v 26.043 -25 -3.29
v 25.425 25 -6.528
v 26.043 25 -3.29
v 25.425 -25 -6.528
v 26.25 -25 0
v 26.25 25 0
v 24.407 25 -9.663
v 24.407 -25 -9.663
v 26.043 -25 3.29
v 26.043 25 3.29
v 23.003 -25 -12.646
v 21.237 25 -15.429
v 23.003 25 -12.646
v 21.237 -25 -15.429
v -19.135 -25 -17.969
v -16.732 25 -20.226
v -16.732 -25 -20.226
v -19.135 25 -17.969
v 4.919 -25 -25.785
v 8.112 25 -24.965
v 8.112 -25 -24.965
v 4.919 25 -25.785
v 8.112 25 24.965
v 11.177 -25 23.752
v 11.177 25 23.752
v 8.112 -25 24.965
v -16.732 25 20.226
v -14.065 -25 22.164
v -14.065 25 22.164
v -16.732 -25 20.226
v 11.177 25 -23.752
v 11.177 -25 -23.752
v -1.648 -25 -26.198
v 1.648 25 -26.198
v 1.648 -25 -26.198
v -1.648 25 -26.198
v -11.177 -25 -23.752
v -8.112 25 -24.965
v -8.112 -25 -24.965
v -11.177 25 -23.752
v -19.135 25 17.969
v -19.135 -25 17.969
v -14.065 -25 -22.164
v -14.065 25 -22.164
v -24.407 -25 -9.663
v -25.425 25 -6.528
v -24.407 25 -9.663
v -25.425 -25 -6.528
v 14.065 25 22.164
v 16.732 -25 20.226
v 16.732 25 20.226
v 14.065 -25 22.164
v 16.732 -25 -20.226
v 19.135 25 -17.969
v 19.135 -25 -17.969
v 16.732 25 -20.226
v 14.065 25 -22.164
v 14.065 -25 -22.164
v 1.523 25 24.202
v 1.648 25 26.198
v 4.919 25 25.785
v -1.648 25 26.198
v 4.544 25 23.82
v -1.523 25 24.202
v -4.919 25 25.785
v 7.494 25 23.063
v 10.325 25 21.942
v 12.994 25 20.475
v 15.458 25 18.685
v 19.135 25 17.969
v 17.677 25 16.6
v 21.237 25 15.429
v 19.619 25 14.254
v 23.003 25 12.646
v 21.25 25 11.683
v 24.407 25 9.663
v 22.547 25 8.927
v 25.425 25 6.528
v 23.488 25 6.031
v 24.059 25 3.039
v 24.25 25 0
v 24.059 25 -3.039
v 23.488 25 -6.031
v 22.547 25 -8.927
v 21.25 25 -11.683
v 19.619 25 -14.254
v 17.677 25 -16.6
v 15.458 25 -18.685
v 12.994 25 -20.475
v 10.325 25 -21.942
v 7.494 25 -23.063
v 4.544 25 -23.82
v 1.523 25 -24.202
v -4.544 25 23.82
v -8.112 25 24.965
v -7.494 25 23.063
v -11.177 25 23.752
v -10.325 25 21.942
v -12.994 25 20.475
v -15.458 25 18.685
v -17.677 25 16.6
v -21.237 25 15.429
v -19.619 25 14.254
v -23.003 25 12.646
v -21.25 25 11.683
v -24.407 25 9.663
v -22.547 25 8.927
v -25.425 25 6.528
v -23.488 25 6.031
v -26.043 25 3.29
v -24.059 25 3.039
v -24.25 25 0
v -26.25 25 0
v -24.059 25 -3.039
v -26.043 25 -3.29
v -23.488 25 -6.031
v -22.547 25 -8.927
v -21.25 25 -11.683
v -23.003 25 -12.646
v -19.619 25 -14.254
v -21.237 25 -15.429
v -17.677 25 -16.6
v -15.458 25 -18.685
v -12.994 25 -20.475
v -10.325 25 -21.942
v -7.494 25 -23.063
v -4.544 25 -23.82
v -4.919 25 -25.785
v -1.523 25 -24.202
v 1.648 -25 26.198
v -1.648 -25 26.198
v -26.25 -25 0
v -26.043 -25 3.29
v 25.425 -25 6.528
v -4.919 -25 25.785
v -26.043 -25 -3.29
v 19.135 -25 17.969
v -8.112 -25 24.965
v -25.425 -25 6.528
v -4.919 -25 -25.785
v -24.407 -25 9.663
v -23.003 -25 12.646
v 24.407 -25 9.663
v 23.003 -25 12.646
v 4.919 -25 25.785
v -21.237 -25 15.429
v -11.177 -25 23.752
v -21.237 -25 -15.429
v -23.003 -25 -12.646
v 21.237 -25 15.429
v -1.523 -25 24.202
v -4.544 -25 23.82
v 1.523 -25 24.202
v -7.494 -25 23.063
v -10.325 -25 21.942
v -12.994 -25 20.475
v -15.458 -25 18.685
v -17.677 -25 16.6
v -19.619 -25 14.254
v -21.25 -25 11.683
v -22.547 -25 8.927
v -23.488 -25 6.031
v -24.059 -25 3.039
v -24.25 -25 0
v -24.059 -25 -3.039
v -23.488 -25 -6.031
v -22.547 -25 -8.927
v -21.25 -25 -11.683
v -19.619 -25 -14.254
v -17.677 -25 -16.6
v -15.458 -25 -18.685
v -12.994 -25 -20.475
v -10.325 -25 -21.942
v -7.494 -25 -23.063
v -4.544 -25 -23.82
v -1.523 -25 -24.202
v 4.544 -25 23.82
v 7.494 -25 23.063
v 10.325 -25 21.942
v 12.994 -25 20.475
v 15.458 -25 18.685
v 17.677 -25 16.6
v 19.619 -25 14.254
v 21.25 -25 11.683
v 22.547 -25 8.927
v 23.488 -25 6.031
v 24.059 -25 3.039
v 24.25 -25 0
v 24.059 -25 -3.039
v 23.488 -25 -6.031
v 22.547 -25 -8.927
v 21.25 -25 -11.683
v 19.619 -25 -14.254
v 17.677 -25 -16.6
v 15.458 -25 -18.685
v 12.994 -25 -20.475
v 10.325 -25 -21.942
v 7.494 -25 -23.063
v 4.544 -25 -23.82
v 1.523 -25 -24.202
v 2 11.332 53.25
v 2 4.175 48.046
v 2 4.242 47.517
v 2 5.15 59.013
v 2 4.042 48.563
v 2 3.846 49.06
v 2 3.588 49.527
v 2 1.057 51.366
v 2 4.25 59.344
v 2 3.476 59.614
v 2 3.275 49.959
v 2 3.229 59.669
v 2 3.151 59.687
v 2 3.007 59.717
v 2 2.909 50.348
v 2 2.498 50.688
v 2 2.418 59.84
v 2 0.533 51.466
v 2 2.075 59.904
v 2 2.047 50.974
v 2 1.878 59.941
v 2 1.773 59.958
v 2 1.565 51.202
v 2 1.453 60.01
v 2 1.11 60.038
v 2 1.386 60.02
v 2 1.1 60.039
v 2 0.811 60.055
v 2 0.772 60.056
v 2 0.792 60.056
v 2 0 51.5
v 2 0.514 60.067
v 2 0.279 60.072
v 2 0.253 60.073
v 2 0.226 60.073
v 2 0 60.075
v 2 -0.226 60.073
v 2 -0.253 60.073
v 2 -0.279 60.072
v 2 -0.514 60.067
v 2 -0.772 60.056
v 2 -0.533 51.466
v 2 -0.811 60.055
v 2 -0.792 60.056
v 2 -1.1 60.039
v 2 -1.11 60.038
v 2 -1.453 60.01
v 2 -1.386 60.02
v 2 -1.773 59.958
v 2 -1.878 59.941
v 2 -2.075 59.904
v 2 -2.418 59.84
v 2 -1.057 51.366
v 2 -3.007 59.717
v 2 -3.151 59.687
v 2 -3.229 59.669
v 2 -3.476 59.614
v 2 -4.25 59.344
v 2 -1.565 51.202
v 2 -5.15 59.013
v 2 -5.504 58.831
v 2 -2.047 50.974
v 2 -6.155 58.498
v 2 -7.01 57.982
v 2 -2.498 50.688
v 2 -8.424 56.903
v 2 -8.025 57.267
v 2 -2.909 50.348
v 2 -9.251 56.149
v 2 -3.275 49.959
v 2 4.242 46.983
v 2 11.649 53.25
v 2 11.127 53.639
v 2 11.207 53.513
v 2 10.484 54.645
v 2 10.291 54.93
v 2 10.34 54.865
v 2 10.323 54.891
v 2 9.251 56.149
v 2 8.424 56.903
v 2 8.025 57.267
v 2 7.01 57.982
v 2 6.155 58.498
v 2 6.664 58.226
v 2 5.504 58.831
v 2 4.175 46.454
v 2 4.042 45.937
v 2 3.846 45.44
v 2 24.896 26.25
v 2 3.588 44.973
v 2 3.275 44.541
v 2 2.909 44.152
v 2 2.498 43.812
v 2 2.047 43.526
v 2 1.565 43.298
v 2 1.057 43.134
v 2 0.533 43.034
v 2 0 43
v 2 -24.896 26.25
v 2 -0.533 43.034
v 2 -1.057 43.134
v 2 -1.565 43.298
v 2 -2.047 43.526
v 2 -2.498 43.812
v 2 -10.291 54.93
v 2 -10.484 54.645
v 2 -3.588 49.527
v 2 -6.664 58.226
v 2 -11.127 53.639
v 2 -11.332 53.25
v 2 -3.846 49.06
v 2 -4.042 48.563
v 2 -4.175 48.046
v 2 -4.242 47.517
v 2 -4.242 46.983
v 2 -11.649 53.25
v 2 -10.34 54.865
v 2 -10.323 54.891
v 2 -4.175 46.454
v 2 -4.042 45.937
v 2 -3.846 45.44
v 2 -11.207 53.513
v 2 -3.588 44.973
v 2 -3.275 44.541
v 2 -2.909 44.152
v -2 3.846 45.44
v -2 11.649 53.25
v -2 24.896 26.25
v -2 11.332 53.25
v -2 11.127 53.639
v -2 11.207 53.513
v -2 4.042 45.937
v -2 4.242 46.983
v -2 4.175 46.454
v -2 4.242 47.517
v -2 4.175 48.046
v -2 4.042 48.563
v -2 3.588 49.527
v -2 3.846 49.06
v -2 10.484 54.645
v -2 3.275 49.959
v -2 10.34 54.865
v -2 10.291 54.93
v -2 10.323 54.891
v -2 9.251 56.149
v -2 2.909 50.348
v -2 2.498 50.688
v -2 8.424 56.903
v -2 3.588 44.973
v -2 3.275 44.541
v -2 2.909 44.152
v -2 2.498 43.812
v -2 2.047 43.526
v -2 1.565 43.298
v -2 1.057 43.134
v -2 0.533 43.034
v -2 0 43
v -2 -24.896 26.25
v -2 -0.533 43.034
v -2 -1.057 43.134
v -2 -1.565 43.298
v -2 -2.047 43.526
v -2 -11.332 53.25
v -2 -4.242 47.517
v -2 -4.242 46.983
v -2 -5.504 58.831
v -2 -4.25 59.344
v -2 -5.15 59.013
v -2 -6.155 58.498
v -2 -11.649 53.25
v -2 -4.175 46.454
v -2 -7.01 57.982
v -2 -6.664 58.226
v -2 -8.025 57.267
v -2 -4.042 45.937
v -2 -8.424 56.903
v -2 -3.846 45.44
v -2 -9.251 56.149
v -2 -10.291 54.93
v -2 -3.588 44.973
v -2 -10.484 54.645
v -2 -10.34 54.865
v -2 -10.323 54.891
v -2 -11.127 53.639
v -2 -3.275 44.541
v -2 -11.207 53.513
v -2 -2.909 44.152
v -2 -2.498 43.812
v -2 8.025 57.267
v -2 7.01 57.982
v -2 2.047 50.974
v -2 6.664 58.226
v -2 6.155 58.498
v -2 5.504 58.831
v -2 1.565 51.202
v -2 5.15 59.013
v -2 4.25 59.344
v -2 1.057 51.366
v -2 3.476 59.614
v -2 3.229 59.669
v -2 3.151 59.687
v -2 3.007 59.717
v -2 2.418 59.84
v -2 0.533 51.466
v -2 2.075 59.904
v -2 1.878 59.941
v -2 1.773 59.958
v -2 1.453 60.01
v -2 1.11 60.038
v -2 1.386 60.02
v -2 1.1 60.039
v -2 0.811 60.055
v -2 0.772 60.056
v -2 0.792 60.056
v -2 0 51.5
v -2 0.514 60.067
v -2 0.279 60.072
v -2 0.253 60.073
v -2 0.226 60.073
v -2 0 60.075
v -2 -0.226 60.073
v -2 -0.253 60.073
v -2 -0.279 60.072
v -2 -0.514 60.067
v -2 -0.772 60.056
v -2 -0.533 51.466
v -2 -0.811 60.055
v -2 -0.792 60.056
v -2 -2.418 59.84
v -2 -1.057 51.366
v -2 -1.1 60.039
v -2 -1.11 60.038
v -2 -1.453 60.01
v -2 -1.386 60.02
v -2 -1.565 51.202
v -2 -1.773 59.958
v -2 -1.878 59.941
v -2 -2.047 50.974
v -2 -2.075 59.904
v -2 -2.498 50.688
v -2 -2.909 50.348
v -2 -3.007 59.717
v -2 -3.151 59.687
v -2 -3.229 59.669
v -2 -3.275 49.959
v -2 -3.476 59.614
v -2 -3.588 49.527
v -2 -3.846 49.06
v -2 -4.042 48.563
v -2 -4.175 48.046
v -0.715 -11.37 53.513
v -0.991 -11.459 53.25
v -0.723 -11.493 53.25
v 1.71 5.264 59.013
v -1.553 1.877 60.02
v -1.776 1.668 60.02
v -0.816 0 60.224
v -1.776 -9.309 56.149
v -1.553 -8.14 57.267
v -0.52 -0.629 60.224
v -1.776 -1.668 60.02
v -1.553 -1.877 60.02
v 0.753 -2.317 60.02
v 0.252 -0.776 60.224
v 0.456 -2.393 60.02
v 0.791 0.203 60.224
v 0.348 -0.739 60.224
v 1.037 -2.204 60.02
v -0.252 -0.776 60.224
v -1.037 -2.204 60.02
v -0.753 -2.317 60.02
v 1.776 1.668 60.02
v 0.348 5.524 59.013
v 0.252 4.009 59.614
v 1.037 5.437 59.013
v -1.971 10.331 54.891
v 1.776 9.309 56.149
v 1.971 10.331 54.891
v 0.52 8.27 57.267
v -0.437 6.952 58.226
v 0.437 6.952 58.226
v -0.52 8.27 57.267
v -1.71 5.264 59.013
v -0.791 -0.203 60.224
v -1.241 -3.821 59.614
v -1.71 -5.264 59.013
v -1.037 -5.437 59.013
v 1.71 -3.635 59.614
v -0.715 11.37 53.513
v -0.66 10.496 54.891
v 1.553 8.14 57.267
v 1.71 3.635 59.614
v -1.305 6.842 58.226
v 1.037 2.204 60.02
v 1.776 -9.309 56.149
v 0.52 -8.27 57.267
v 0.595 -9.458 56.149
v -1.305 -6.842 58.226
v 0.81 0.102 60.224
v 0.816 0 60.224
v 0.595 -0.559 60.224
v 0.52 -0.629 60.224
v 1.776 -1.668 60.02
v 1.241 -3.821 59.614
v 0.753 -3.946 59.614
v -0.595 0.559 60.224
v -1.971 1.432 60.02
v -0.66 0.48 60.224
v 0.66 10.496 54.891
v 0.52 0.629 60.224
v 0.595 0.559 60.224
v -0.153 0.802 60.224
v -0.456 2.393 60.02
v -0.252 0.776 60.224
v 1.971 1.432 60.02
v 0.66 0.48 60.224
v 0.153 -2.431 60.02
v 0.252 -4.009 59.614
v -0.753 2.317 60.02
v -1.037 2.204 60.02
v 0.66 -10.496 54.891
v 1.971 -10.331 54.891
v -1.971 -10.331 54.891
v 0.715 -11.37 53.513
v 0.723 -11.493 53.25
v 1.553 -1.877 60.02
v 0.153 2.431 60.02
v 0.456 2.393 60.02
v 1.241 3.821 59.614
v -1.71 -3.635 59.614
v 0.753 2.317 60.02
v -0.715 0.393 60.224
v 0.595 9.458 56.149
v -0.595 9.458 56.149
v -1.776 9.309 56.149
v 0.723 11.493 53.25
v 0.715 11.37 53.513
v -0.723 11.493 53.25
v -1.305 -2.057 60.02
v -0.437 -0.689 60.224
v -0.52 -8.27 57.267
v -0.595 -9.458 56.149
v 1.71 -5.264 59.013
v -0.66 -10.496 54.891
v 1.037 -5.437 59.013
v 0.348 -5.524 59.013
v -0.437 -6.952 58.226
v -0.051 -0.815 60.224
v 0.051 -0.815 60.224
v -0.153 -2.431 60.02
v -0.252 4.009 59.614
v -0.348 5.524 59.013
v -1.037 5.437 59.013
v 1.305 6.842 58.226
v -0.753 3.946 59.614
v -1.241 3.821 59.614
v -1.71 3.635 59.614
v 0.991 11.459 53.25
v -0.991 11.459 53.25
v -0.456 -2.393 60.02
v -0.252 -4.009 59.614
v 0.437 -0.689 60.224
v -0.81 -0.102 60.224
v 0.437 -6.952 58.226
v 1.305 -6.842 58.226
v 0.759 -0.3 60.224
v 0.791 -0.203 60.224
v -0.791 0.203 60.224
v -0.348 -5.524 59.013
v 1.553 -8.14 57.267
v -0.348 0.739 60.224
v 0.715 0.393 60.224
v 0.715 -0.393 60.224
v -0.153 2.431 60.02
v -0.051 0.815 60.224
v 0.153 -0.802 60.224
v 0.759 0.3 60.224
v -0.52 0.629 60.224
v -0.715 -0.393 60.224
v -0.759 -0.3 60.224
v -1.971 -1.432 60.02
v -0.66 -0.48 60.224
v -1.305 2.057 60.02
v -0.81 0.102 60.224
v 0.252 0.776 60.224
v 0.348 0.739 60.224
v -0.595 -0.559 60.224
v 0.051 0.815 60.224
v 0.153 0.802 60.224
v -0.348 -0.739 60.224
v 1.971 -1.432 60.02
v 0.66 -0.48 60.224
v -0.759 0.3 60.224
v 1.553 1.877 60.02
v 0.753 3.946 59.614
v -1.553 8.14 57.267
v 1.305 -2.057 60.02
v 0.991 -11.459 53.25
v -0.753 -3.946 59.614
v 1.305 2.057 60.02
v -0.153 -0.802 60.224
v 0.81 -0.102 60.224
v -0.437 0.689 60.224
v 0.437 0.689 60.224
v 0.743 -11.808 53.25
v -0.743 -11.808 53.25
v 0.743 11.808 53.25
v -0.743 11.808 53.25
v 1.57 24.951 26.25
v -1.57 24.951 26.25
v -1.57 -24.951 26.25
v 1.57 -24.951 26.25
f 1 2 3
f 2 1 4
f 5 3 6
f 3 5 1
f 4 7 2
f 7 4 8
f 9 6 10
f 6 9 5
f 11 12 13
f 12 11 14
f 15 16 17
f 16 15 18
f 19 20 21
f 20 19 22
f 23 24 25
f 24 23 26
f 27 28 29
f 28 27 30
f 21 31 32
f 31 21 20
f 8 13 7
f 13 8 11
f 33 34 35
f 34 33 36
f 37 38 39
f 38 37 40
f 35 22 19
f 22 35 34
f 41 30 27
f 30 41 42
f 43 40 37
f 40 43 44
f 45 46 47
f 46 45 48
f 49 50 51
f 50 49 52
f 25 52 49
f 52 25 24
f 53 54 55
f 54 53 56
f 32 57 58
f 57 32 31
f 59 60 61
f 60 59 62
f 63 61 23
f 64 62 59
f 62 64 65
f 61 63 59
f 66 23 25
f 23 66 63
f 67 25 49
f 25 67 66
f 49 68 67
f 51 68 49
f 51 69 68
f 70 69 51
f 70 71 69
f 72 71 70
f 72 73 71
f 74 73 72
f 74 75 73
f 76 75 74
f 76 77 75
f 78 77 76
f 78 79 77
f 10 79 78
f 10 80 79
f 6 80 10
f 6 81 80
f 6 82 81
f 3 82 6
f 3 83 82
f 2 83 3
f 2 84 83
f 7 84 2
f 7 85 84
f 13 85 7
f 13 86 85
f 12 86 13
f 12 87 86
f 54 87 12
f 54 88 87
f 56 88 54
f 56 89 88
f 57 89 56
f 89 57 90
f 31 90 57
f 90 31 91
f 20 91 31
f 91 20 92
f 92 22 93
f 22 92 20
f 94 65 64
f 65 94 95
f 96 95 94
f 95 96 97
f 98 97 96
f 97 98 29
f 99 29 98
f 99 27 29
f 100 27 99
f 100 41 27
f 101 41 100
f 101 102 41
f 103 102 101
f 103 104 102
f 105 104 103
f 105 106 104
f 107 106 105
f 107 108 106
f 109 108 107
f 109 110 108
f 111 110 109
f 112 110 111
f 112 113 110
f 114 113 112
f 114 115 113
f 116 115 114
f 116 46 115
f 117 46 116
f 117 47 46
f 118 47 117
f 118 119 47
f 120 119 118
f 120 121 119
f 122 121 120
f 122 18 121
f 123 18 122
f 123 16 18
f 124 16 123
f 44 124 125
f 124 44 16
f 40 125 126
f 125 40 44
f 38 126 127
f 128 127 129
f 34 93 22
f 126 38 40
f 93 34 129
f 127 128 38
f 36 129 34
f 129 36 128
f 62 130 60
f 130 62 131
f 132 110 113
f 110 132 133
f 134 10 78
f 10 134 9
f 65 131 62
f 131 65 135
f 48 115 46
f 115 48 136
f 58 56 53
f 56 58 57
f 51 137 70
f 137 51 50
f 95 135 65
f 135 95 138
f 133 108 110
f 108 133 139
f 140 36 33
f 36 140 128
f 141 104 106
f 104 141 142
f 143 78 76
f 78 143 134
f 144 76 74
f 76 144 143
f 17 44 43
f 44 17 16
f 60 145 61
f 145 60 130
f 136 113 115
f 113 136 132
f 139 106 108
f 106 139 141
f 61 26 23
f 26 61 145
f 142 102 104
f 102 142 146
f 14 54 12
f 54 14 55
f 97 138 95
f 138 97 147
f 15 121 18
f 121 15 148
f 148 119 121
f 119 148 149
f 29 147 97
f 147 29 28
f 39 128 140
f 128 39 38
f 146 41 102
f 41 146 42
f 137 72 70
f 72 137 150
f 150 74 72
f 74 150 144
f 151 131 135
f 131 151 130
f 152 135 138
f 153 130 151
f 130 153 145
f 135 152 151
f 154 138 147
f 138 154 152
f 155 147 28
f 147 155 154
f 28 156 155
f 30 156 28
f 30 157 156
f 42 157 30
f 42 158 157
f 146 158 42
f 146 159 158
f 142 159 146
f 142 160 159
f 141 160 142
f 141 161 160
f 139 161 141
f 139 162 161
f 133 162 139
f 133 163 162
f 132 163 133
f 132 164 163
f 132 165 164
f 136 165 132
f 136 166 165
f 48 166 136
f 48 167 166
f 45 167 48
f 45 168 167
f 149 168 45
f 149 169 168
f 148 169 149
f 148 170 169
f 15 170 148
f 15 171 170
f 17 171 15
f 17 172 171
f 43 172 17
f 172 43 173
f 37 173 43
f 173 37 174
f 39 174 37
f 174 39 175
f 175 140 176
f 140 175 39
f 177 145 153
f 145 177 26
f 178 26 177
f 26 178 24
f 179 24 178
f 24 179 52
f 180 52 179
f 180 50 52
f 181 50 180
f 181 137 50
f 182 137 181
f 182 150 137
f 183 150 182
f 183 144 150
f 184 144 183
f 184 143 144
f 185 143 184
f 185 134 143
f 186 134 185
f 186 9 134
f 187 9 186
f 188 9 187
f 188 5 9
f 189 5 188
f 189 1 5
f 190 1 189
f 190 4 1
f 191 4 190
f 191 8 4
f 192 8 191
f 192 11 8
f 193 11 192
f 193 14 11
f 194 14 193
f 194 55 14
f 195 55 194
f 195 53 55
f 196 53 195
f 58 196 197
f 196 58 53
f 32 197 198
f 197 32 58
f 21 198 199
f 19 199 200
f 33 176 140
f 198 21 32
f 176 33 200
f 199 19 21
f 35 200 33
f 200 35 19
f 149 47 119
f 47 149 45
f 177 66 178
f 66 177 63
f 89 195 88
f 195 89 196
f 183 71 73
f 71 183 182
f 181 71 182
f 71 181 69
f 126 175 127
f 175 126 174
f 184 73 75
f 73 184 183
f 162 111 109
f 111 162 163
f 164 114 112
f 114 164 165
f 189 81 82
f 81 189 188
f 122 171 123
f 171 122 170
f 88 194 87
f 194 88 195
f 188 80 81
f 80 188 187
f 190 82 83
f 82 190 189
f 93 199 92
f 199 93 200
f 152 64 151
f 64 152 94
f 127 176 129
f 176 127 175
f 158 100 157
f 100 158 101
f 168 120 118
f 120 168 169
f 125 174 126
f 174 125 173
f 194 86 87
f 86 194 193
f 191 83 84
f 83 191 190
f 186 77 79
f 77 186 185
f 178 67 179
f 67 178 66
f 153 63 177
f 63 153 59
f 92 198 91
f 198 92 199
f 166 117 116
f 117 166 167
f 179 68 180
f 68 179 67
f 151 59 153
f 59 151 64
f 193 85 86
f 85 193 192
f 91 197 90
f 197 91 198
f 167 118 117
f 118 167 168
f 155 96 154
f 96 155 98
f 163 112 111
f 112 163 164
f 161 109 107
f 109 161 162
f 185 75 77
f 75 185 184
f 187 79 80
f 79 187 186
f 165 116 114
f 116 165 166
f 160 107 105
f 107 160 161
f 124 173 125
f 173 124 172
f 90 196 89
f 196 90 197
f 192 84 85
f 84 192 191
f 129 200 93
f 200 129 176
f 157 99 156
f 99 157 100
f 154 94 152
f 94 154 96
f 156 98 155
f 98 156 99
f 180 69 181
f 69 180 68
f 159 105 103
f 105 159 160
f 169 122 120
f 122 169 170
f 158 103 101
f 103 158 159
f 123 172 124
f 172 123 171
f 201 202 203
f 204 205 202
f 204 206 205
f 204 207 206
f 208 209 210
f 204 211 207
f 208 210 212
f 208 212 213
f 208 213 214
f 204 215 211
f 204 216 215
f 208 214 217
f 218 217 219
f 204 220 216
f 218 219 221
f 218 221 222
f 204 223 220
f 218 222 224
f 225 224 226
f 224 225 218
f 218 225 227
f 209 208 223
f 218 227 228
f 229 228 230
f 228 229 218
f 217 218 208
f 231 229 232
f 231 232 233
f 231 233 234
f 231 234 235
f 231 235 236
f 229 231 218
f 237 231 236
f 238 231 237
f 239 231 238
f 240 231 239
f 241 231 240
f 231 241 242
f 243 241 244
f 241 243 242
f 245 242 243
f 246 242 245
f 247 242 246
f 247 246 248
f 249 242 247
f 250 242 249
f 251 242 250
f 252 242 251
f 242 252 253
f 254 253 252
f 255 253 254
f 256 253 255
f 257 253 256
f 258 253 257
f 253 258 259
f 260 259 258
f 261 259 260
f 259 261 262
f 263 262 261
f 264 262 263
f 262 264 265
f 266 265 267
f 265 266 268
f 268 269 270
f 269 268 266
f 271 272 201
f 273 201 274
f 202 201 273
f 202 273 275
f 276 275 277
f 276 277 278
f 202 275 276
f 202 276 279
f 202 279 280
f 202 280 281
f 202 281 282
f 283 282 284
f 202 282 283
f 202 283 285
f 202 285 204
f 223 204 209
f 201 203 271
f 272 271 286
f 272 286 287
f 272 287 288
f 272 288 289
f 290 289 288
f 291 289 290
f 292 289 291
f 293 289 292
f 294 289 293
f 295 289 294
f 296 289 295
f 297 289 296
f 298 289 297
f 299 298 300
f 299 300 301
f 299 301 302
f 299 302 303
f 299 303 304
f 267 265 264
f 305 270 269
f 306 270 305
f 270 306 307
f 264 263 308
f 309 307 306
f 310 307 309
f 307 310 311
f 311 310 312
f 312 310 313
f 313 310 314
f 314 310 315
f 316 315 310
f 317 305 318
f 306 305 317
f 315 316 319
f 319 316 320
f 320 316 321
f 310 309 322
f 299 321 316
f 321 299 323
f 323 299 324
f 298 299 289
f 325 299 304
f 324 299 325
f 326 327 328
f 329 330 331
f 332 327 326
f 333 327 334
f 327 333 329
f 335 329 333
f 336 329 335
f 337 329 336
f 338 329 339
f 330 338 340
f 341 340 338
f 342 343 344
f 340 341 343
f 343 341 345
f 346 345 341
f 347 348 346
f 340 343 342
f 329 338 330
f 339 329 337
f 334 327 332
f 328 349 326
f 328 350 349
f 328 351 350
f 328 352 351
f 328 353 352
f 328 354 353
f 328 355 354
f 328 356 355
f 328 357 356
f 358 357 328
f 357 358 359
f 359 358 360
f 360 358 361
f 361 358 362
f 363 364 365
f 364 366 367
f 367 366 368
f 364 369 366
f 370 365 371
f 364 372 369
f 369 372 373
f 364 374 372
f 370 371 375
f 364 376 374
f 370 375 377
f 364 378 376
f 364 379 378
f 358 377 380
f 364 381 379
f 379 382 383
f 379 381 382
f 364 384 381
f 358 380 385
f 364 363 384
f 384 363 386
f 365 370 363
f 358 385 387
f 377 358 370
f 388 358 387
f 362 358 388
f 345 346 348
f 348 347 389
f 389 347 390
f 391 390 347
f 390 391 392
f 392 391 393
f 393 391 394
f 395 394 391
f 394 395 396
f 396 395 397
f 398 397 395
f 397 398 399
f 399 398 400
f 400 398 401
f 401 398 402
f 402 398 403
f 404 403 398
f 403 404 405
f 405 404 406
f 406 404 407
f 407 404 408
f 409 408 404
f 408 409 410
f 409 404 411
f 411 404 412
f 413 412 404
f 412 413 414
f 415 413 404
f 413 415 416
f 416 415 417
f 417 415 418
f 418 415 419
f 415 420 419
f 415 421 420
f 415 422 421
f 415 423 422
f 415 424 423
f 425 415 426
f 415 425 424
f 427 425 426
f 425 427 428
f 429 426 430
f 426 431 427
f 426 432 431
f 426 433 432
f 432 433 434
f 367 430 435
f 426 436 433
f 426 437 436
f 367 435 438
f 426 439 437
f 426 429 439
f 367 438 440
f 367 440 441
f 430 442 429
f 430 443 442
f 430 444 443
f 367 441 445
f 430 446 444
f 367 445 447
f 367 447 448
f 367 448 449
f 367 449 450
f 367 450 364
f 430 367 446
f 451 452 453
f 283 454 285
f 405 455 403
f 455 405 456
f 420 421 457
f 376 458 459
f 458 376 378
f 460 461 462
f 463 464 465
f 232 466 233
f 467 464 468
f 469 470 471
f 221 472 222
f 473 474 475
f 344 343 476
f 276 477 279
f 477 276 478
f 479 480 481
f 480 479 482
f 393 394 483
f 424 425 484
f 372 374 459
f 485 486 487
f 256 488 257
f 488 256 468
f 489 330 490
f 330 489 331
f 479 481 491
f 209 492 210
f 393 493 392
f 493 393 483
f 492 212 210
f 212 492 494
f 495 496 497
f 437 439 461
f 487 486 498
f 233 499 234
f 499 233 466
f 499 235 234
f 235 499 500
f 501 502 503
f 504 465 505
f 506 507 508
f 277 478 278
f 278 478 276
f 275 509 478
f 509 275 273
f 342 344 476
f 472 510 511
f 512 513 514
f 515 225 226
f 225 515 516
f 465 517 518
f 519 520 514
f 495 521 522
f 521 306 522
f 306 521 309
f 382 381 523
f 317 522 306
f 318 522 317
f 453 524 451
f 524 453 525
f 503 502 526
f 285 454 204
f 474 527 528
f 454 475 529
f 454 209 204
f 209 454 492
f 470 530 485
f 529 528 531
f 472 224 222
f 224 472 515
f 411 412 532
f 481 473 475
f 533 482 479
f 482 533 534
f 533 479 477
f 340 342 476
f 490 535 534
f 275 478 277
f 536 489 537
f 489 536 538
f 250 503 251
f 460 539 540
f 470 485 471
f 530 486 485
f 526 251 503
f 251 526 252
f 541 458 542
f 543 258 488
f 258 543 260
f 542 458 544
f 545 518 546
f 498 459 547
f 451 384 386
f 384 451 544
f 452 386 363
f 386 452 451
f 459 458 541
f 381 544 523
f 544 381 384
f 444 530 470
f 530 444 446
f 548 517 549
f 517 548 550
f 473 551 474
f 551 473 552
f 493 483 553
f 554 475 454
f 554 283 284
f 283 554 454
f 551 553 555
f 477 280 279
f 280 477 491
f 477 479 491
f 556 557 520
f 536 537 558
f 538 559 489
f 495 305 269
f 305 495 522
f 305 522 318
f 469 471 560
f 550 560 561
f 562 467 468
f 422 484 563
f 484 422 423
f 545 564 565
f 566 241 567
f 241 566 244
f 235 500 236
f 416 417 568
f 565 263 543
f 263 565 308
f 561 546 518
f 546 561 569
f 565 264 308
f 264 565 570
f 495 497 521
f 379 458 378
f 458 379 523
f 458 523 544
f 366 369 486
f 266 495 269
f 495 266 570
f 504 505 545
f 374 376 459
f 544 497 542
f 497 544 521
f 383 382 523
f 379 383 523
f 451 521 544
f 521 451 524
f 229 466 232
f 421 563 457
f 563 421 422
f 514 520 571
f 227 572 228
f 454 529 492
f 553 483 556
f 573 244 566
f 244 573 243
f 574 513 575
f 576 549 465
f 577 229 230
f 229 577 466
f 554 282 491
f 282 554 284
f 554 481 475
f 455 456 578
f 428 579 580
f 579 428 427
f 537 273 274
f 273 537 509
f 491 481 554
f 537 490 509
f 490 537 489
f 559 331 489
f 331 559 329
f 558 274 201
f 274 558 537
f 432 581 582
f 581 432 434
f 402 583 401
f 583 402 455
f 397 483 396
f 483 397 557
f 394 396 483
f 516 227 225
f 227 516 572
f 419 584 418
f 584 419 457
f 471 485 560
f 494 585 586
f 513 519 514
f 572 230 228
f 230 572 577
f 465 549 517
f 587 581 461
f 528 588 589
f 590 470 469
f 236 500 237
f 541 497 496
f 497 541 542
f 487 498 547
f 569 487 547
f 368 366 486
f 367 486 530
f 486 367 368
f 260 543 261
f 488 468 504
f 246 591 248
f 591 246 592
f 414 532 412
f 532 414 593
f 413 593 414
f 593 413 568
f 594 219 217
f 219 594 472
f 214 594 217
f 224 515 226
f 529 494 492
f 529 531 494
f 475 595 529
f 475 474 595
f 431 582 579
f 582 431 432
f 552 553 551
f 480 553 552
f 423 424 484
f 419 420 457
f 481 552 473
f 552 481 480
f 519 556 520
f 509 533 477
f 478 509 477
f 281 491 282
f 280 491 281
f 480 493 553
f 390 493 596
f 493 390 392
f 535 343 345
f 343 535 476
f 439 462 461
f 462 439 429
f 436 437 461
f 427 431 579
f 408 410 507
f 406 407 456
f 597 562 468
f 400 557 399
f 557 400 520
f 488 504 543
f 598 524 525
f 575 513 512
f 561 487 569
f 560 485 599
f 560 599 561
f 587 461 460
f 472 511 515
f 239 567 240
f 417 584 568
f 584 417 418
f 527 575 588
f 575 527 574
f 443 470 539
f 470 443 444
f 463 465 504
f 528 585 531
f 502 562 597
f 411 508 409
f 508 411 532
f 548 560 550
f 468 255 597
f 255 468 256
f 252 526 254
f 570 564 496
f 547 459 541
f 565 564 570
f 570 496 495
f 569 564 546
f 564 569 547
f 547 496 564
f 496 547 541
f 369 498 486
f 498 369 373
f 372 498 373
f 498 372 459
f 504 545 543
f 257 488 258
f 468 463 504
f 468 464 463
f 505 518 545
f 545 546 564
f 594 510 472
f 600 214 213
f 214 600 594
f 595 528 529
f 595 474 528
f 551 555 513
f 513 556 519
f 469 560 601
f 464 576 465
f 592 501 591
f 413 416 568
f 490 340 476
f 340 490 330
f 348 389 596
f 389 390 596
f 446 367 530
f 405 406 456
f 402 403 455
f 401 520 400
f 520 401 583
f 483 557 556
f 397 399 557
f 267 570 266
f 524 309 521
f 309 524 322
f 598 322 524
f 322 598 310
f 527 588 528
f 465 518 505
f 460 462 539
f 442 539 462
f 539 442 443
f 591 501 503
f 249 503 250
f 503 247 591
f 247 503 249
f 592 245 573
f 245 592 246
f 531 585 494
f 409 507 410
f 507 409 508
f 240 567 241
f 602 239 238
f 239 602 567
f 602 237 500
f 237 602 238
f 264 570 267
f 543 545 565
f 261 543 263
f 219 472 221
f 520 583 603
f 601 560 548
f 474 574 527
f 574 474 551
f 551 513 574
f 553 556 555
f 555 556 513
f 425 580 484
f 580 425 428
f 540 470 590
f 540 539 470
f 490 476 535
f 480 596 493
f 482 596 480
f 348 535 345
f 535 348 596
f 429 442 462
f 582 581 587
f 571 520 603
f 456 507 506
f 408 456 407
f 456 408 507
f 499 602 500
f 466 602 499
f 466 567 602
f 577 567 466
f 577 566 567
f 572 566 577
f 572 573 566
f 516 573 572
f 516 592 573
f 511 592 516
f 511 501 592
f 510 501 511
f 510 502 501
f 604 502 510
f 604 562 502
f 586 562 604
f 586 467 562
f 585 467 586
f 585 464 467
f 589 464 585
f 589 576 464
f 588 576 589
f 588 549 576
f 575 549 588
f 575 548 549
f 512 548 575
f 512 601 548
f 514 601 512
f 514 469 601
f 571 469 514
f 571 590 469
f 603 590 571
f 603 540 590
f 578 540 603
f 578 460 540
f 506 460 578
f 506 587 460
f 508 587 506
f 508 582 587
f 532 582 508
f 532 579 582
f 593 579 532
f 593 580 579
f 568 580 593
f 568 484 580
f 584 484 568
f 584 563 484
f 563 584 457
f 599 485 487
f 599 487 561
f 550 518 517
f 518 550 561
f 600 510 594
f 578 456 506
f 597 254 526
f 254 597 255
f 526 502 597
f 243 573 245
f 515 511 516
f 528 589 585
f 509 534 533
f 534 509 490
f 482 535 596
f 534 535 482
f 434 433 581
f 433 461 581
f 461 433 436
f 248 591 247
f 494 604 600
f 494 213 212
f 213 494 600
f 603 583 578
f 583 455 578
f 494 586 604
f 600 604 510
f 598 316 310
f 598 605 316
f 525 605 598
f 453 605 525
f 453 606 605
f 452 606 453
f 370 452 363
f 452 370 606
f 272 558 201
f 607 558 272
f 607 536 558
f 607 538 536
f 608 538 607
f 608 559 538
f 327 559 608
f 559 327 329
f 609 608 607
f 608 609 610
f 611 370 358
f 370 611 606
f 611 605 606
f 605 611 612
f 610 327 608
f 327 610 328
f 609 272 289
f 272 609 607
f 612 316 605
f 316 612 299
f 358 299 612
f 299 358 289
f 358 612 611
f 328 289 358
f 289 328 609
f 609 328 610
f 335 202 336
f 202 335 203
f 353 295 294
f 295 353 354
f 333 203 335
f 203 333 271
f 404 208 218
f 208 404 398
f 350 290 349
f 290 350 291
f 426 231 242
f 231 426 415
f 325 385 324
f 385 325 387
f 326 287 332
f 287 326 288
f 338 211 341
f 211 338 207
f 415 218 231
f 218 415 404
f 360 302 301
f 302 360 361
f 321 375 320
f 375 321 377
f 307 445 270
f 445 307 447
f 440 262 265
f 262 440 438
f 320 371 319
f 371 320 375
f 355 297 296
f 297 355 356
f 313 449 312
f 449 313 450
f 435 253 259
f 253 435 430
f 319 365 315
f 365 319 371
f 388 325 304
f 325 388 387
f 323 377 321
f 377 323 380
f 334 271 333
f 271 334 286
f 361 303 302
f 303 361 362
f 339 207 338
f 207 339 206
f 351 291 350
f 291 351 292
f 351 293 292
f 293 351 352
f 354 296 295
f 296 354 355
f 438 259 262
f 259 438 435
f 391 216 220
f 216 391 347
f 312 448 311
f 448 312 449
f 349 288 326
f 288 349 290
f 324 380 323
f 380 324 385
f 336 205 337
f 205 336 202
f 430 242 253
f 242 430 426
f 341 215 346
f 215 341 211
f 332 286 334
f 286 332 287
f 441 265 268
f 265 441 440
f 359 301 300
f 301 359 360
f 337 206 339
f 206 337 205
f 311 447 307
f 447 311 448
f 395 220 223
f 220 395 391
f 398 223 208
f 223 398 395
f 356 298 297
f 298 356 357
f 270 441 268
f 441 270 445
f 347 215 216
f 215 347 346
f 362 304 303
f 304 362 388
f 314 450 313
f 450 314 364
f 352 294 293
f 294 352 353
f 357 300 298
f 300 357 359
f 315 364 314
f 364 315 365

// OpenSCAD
Upor();


    uporWid = 50;
    thicns = 2;
    tubeDia = 48.5;
    shplintHoleDia = 8.5;
    shplintHoleHeig = 21;
    sphereRad = 13;



module Upor() {

    $fn = 50;

    py = - uporWid/2;

    // Охват
    difference() {
        
        rotate([-90,0,0]) 
        cylinder(h=uporWid, d = tubeDia+2*thicns,center=true);
        
        rotate([-90,0,0]) 
        cylinder(h=uporWid+2, d = tubeDia,center=true);           
    }

    difference() 
    {
   
        intersection() 
        {
            union() 
            {
                intersection() 
                {

                    //срез полный    
                    translate([-thicns,py,tubeDia/2+1]) 
                    cube([thicns*2, uporWid, uporWid]);

                    //сфера
                    translate([0,0,tubeDia/2+thicns+shplintHoleHeig])
                    sphere(r=sphereRad);
                }

                //срез внутренний    
                translate([-thicns,py,tubeDia/2+1]) 
                cube([thicns*2, uporWid, uporWid/2+3]);
            }

            //конус
            translate([0,0,tubeDia/2+thicns])
            cylinder(h=uporWid*tan(64)/2,d1=uporWid,d2=0);    
        }



        //цилиндр дырки
        translate([0,0,tubeDia/2+thicns+shplintHoleHeig])
        rotate([0,-90,0])
        cylinder(h=tubeDia,d=shplintHoleDia,center=true);    

    }

}
